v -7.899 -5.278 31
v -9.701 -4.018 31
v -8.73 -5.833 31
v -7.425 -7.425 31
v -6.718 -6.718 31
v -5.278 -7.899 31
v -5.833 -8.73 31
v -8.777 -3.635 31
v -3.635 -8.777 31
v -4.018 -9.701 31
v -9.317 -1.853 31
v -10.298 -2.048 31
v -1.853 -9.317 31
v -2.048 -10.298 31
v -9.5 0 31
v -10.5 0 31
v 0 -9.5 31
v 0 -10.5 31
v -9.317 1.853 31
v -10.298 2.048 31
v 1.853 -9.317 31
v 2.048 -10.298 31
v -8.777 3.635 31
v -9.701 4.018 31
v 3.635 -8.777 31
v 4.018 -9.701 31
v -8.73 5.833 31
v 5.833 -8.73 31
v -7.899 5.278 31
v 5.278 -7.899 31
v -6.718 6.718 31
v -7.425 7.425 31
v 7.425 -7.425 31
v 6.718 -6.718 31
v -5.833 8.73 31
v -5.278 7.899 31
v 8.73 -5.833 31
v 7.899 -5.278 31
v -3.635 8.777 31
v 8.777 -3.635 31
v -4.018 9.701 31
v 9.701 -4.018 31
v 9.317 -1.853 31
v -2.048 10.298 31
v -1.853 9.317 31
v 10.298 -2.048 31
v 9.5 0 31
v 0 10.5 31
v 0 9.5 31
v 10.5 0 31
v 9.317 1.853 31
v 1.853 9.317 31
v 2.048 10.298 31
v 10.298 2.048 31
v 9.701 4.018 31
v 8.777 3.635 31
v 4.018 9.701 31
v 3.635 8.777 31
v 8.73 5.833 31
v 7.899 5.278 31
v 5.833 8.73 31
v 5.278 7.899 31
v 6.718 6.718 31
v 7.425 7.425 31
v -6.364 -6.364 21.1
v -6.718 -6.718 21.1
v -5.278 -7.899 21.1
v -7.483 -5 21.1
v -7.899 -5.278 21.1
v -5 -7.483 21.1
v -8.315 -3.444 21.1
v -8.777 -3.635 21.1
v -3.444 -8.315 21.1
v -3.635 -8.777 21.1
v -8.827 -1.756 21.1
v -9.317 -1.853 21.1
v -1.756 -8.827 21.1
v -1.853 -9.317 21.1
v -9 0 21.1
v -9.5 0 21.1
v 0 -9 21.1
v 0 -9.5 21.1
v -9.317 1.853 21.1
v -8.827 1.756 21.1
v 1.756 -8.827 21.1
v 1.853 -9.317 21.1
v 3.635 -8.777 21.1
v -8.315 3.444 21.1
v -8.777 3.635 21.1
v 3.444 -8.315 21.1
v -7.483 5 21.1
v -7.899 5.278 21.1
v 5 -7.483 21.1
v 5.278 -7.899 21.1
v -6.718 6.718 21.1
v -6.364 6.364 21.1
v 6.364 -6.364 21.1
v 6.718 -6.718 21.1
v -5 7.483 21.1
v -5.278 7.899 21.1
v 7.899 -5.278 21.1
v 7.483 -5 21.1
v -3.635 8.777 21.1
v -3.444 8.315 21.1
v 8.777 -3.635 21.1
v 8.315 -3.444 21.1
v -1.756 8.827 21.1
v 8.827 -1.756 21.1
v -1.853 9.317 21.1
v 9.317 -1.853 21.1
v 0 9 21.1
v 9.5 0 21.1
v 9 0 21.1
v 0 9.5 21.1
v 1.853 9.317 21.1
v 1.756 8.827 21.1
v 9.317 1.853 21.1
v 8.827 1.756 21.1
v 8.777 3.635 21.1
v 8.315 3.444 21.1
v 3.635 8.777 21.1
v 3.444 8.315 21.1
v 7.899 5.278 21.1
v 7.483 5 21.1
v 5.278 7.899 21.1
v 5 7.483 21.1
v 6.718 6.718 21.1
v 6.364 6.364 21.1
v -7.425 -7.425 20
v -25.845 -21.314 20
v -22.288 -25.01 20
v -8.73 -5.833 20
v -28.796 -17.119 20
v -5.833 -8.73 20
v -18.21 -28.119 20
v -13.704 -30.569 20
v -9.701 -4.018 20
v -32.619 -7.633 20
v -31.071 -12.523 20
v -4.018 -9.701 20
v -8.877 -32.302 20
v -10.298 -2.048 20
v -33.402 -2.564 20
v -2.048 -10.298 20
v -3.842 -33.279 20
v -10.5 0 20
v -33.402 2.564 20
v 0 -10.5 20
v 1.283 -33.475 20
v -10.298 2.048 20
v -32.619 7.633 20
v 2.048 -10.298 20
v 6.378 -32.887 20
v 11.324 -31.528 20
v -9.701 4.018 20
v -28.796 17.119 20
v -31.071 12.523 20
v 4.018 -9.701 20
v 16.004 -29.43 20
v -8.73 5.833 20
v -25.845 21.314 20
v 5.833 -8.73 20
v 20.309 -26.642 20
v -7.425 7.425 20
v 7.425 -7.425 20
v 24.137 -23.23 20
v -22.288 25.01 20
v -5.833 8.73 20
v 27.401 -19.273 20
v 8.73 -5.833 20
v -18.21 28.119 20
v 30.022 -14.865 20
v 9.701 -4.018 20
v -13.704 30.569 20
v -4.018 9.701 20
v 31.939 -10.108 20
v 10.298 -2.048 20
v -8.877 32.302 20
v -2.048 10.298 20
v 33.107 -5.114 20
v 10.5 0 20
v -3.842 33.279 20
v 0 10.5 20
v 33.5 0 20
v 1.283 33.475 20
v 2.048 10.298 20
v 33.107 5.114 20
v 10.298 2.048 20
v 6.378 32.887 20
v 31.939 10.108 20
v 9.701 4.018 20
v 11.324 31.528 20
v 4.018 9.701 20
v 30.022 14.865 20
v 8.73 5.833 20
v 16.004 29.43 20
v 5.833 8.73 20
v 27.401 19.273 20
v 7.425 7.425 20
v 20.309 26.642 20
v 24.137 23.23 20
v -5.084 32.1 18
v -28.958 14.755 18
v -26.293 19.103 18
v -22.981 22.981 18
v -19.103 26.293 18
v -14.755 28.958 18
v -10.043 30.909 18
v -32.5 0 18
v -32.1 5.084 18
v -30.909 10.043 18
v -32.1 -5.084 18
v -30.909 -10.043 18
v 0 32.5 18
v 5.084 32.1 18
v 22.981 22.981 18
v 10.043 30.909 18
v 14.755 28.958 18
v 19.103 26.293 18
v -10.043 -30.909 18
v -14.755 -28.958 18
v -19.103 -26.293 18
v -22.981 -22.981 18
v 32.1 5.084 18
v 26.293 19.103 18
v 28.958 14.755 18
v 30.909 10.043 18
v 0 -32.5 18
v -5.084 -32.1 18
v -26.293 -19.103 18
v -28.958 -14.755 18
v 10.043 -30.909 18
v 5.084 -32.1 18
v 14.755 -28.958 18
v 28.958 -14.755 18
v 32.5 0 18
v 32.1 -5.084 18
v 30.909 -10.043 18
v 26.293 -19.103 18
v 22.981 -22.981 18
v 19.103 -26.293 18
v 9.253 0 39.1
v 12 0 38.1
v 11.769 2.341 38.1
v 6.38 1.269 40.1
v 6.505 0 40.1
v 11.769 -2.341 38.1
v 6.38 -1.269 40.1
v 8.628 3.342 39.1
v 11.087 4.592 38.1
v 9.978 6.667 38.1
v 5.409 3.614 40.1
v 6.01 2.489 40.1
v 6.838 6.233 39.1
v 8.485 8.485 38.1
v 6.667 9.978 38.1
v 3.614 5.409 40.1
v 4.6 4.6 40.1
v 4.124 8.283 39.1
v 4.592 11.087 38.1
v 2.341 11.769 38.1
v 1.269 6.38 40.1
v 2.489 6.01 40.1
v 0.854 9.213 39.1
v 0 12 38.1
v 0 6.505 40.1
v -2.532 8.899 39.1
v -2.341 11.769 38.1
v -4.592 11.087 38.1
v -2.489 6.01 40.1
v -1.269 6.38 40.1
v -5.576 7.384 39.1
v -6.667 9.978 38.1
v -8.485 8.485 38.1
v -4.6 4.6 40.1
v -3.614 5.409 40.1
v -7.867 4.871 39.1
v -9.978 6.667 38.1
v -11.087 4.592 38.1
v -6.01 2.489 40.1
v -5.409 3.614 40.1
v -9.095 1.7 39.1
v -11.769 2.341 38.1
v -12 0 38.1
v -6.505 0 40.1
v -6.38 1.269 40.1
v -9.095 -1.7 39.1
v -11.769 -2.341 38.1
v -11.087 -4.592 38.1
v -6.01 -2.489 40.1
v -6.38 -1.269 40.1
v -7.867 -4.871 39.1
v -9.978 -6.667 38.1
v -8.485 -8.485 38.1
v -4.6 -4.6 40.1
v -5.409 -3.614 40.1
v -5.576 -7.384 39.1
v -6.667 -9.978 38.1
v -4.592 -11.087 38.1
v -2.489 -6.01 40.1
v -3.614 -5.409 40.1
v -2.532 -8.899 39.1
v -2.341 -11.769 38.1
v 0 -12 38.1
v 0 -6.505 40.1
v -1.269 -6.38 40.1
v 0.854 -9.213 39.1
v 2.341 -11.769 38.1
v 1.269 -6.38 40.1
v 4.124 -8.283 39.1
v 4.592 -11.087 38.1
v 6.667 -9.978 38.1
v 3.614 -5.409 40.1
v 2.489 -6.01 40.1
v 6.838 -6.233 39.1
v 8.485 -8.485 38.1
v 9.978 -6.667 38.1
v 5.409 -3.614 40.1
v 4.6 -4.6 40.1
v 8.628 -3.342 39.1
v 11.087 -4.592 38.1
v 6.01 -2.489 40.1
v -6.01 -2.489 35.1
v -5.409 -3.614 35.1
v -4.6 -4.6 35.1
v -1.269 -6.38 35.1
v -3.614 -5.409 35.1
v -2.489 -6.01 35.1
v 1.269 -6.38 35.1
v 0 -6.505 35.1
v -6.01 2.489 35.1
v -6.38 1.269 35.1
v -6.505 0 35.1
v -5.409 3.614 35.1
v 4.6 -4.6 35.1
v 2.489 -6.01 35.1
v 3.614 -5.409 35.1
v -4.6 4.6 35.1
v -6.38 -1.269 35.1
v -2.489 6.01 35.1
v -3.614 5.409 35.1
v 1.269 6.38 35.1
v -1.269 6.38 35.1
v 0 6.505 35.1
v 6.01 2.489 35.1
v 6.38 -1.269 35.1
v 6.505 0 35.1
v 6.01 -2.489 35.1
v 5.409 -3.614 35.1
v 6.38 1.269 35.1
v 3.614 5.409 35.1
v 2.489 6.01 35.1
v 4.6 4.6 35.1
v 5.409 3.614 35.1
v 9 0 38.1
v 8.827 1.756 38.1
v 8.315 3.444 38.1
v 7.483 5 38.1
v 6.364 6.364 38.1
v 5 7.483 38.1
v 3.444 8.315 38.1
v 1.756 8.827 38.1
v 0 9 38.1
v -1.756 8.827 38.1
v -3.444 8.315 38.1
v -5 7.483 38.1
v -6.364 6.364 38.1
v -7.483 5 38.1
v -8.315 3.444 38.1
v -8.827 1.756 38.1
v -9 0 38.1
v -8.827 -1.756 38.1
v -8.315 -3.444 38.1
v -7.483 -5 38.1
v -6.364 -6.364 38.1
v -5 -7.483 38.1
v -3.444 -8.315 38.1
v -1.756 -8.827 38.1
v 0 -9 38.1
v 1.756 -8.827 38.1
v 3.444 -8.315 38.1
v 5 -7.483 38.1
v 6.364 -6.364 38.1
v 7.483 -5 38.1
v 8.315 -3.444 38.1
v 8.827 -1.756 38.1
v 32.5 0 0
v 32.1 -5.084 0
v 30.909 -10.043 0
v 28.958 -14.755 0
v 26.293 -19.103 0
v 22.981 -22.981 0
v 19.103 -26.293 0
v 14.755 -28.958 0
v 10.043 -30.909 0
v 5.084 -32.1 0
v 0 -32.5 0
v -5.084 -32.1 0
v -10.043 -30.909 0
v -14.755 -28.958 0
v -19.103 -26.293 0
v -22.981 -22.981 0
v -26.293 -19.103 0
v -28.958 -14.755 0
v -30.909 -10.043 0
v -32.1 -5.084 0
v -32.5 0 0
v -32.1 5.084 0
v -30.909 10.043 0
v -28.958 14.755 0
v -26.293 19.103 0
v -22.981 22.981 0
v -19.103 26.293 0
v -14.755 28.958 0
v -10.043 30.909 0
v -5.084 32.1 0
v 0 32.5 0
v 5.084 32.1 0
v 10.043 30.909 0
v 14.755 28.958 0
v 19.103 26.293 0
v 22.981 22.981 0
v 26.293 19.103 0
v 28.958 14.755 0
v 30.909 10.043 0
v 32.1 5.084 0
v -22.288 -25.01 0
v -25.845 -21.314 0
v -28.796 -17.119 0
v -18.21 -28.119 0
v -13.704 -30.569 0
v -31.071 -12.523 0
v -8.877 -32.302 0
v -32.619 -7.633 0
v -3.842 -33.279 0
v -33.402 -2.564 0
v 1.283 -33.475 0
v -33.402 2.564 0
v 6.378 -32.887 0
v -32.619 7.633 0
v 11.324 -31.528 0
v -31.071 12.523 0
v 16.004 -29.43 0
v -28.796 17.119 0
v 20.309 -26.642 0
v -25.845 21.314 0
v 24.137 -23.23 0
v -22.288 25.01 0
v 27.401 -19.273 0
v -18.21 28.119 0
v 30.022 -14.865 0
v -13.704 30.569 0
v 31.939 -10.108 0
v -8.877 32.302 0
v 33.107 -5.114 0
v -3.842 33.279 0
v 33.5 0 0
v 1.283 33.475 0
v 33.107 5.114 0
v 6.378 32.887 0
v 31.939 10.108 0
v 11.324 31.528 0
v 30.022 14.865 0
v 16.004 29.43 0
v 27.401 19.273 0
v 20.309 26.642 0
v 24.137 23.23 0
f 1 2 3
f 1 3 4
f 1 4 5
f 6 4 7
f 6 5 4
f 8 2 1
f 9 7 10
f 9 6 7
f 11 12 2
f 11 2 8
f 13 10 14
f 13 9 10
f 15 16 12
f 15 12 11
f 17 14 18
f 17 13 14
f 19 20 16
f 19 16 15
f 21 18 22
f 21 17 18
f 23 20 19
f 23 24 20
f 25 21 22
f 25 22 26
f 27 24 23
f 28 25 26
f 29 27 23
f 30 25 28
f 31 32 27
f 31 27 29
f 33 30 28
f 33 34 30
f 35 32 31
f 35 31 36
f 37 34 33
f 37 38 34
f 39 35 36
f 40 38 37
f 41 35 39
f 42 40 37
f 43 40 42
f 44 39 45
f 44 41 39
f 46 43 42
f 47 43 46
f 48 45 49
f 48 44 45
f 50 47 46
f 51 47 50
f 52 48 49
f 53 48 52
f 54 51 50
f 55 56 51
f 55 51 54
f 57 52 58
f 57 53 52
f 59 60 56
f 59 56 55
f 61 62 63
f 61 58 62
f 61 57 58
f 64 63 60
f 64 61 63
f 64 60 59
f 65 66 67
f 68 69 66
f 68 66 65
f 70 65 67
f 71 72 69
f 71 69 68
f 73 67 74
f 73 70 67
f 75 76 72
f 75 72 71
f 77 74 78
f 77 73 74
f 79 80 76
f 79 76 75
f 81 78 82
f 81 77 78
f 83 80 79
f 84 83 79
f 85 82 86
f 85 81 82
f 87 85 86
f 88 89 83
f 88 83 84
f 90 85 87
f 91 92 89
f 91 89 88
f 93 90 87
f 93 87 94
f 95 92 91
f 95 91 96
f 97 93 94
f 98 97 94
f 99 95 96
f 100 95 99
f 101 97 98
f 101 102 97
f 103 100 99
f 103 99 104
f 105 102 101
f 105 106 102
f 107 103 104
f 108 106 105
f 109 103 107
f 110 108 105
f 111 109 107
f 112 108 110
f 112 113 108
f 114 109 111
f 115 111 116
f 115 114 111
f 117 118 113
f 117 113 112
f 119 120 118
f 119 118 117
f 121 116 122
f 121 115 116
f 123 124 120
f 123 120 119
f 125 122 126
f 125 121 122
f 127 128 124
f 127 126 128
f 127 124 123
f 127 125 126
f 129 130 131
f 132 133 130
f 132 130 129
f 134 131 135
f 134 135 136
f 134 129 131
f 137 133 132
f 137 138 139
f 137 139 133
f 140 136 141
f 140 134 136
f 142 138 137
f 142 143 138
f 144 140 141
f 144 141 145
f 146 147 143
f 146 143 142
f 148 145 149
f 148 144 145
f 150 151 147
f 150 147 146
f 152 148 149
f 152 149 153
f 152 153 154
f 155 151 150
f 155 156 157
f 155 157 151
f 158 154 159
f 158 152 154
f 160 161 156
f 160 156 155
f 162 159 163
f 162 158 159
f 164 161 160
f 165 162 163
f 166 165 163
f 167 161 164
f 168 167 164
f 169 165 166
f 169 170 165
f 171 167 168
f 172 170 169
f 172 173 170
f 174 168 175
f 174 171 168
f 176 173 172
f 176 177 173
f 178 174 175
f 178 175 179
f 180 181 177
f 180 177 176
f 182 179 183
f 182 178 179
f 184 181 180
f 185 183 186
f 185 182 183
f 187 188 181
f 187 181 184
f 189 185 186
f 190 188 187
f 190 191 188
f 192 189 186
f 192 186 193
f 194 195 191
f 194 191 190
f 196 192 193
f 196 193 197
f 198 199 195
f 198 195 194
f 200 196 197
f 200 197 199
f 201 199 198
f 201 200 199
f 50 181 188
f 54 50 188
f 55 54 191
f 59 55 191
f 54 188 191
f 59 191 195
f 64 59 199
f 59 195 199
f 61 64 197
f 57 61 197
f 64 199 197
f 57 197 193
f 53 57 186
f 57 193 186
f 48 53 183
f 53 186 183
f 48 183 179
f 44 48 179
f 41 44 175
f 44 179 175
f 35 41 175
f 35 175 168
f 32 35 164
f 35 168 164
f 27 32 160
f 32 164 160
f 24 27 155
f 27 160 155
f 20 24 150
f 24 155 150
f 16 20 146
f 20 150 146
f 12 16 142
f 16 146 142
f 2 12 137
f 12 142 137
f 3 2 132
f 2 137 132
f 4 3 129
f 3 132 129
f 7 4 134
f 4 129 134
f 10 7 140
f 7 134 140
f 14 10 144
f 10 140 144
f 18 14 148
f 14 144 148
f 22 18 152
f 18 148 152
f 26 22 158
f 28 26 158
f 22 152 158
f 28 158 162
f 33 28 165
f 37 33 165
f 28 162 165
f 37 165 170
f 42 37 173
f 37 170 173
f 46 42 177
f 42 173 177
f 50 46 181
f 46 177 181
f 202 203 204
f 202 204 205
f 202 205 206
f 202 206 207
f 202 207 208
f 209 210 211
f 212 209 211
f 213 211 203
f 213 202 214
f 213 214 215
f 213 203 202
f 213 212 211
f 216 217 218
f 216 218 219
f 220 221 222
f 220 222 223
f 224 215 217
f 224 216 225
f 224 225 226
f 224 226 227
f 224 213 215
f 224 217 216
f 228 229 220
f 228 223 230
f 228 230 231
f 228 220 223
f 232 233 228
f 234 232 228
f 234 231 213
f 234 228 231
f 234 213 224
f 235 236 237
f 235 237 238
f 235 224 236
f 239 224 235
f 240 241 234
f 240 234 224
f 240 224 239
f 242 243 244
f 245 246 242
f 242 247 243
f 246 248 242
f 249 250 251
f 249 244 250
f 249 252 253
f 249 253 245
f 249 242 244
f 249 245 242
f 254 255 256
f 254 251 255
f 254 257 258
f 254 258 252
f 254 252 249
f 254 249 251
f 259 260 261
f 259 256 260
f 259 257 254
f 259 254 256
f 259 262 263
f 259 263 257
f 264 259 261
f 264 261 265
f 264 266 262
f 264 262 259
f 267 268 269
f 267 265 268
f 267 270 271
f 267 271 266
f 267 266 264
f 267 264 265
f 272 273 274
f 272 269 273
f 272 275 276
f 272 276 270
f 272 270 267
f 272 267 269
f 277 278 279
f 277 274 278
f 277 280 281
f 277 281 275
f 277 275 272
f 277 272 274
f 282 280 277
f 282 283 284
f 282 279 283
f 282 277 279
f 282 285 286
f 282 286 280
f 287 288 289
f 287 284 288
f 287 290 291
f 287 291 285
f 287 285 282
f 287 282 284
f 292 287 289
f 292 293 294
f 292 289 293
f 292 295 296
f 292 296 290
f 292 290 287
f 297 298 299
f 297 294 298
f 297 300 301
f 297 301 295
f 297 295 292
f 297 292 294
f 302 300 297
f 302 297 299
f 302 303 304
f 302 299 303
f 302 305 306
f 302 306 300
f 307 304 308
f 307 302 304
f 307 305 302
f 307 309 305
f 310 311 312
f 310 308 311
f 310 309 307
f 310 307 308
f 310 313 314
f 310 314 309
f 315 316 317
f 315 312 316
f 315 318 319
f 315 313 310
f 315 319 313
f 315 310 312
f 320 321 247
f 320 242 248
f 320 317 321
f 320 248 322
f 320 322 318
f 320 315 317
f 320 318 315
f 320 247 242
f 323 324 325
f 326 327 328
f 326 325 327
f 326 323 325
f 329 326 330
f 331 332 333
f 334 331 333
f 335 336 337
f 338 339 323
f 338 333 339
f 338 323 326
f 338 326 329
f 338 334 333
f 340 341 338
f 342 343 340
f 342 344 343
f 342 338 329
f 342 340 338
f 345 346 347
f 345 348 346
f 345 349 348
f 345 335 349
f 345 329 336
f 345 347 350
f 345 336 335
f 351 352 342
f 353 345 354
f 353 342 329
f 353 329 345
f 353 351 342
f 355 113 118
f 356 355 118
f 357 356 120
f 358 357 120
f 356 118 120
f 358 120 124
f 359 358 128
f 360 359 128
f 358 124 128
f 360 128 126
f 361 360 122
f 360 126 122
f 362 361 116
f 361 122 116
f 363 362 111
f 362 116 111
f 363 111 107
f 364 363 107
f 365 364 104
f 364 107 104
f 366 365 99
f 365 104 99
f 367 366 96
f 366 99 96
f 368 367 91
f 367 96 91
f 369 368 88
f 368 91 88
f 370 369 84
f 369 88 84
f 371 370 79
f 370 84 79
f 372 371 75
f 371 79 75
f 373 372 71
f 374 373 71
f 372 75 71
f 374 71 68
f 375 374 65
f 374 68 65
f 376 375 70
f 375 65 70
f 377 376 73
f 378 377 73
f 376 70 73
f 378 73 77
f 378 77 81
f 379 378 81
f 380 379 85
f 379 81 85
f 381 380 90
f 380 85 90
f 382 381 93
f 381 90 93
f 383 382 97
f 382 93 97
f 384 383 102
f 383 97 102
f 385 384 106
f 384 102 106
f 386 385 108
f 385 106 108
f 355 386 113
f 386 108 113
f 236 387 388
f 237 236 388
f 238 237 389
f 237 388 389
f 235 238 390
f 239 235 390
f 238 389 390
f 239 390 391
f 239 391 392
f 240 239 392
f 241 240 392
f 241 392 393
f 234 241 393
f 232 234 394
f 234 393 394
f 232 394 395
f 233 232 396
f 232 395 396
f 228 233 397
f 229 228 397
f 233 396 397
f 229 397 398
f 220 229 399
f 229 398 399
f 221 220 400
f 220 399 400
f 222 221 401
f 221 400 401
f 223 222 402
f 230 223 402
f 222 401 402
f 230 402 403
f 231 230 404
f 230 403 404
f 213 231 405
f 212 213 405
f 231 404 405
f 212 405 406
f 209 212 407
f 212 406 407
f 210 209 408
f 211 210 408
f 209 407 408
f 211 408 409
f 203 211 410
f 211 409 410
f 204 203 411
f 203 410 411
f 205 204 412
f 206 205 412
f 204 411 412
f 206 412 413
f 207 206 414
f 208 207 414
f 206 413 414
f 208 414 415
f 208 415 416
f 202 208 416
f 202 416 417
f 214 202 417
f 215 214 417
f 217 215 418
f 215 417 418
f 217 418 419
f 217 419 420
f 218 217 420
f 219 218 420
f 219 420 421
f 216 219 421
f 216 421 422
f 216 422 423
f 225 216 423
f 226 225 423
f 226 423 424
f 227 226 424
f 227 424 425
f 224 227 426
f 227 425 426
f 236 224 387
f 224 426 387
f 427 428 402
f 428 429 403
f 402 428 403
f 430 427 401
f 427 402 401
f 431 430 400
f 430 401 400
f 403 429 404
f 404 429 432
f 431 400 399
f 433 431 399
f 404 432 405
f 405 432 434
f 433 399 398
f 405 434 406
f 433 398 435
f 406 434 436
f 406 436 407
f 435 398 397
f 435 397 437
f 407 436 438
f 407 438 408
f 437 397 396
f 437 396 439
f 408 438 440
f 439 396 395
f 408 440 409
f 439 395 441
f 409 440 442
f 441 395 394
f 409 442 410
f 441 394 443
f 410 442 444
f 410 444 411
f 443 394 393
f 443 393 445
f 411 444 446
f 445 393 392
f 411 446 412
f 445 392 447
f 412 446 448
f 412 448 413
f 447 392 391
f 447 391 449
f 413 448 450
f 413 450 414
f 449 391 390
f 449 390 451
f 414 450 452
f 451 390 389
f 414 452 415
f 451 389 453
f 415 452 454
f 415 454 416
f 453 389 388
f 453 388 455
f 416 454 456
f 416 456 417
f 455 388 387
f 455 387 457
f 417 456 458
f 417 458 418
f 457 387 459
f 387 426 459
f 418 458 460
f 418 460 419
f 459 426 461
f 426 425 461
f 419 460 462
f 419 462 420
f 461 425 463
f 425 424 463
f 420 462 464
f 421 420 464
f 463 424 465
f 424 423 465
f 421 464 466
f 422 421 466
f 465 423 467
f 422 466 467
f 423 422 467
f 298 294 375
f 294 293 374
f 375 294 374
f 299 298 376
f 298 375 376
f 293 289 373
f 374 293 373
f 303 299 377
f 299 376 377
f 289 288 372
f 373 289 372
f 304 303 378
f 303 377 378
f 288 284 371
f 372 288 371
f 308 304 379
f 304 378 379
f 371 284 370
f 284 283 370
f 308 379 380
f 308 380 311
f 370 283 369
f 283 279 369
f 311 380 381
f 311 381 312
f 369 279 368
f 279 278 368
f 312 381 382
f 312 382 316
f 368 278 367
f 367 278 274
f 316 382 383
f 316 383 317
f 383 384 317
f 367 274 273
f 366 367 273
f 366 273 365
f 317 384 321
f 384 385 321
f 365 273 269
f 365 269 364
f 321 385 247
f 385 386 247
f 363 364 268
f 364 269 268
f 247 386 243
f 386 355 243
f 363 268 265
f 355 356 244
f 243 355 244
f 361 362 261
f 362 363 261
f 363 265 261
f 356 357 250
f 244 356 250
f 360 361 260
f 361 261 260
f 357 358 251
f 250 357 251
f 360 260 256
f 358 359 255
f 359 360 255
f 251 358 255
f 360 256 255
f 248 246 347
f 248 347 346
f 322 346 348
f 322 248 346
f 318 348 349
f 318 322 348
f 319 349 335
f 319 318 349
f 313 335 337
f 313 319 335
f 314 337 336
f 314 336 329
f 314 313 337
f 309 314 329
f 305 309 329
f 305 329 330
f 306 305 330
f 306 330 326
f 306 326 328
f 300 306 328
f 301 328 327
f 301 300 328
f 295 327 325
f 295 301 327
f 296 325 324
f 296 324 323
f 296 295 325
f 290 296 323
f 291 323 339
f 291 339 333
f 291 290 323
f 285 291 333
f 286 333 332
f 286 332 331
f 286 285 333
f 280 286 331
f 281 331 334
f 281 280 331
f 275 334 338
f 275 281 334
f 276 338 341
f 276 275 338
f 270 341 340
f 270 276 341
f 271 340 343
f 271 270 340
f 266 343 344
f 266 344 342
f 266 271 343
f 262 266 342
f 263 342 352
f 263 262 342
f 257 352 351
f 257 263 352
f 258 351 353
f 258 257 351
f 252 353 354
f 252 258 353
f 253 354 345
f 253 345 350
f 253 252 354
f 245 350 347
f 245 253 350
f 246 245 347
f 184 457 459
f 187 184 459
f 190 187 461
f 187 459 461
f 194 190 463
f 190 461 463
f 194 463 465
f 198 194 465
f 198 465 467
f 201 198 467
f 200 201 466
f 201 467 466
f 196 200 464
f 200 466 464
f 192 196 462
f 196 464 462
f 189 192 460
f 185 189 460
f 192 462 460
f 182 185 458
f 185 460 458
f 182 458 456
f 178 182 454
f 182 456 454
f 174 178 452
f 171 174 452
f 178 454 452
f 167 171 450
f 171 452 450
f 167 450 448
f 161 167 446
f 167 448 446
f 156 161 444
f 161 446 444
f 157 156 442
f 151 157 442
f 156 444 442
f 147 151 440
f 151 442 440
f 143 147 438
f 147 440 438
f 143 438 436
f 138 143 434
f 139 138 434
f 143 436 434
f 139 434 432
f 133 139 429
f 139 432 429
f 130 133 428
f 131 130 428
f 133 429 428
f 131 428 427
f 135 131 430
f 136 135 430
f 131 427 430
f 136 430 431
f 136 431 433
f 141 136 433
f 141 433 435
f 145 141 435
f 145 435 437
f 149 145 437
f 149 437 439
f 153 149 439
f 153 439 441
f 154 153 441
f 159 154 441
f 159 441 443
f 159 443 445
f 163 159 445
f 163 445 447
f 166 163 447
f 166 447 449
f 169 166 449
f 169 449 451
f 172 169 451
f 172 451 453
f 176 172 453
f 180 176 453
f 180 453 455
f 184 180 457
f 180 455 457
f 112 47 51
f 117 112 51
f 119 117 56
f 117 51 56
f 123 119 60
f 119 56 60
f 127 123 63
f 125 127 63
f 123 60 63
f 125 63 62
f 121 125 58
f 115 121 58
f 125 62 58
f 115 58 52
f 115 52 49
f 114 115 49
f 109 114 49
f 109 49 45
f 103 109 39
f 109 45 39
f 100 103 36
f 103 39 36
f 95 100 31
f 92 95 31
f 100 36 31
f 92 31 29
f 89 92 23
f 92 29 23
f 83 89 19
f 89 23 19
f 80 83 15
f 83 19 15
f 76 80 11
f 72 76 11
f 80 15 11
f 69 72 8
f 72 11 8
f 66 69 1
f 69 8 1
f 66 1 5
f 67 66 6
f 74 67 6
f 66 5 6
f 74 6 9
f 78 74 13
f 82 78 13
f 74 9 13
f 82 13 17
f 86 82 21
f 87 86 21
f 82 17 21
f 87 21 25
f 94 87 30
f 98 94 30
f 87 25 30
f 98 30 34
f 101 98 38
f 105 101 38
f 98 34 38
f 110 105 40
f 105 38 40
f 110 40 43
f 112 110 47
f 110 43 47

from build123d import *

# Parameters (mm, degrees)
F0_R      = 33.5
F1_DEPTH  = 20
F2_R      = 32.5
F3_DEPTH  = 18
F4_R      = 10.5
F5_DEPTH  = 11
F6_R      = 9.5
F7_DEPTH  = 9.9
F8_R      = 9
F9_DEPTH  = 17
F10_R     = 12
F11_DEPTH = 2
F11_TAPER = 70
F12_DEPTH = 5


with BuildPart() as f1:
    # F0 (on Top) → F1 (new body)
    with BuildSketch(Plane.XY):
        Circle(F0_R)
    extrude(amount=F1_DEPTH)

    # F2 (on face) → F3 (cut)
    with BuildSketch(Plane(origin=(0, 0, 0), x_dir=(1, 0, 0), z_dir=(0, 0, -1))):
        Circle(F2_R)
    extrude(amount=-F3_DEPTH, mode=Mode.SUBTRACT)

    # F4 (on face) → F5 (join)
    with BuildSketch(Plane.XY.offset(20)):
        Circle(F4_R)
    extrude(amount=F5_DEPTH)

    # F6 (on face) → F7 (cut)
    with BuildSketch(Plane.XY.offset(31)):
        Circle(F6_R)
    extrude(amount=-F7_DEPTH, mode=Mode.SUBTRACT)

    # F8 (on face) → F9 (join)
    with BuildSketch(Plane.XY.offset(21.1)):
        Circle(F8_R)
    extrude(amount=F9_DEPTH)

    # F10 (on face) → F11 (join)
    with BuildSketch(Plane.XY.offset(38.1)):
        Circle(F10_R)
    extrude(amount=F11_DEPTH, taper=F11_TAPER)

    # F12 (cut): a face of the model
    f12_faces = [f1.faces().sort_by_distance(p)[0] for p in [
        (0, 0, 40.1),
    ]]
    extrude(f12_faces, amount=-F12_DEPTH, mode=Mode.SUBTRACT)


solid = f1.part
